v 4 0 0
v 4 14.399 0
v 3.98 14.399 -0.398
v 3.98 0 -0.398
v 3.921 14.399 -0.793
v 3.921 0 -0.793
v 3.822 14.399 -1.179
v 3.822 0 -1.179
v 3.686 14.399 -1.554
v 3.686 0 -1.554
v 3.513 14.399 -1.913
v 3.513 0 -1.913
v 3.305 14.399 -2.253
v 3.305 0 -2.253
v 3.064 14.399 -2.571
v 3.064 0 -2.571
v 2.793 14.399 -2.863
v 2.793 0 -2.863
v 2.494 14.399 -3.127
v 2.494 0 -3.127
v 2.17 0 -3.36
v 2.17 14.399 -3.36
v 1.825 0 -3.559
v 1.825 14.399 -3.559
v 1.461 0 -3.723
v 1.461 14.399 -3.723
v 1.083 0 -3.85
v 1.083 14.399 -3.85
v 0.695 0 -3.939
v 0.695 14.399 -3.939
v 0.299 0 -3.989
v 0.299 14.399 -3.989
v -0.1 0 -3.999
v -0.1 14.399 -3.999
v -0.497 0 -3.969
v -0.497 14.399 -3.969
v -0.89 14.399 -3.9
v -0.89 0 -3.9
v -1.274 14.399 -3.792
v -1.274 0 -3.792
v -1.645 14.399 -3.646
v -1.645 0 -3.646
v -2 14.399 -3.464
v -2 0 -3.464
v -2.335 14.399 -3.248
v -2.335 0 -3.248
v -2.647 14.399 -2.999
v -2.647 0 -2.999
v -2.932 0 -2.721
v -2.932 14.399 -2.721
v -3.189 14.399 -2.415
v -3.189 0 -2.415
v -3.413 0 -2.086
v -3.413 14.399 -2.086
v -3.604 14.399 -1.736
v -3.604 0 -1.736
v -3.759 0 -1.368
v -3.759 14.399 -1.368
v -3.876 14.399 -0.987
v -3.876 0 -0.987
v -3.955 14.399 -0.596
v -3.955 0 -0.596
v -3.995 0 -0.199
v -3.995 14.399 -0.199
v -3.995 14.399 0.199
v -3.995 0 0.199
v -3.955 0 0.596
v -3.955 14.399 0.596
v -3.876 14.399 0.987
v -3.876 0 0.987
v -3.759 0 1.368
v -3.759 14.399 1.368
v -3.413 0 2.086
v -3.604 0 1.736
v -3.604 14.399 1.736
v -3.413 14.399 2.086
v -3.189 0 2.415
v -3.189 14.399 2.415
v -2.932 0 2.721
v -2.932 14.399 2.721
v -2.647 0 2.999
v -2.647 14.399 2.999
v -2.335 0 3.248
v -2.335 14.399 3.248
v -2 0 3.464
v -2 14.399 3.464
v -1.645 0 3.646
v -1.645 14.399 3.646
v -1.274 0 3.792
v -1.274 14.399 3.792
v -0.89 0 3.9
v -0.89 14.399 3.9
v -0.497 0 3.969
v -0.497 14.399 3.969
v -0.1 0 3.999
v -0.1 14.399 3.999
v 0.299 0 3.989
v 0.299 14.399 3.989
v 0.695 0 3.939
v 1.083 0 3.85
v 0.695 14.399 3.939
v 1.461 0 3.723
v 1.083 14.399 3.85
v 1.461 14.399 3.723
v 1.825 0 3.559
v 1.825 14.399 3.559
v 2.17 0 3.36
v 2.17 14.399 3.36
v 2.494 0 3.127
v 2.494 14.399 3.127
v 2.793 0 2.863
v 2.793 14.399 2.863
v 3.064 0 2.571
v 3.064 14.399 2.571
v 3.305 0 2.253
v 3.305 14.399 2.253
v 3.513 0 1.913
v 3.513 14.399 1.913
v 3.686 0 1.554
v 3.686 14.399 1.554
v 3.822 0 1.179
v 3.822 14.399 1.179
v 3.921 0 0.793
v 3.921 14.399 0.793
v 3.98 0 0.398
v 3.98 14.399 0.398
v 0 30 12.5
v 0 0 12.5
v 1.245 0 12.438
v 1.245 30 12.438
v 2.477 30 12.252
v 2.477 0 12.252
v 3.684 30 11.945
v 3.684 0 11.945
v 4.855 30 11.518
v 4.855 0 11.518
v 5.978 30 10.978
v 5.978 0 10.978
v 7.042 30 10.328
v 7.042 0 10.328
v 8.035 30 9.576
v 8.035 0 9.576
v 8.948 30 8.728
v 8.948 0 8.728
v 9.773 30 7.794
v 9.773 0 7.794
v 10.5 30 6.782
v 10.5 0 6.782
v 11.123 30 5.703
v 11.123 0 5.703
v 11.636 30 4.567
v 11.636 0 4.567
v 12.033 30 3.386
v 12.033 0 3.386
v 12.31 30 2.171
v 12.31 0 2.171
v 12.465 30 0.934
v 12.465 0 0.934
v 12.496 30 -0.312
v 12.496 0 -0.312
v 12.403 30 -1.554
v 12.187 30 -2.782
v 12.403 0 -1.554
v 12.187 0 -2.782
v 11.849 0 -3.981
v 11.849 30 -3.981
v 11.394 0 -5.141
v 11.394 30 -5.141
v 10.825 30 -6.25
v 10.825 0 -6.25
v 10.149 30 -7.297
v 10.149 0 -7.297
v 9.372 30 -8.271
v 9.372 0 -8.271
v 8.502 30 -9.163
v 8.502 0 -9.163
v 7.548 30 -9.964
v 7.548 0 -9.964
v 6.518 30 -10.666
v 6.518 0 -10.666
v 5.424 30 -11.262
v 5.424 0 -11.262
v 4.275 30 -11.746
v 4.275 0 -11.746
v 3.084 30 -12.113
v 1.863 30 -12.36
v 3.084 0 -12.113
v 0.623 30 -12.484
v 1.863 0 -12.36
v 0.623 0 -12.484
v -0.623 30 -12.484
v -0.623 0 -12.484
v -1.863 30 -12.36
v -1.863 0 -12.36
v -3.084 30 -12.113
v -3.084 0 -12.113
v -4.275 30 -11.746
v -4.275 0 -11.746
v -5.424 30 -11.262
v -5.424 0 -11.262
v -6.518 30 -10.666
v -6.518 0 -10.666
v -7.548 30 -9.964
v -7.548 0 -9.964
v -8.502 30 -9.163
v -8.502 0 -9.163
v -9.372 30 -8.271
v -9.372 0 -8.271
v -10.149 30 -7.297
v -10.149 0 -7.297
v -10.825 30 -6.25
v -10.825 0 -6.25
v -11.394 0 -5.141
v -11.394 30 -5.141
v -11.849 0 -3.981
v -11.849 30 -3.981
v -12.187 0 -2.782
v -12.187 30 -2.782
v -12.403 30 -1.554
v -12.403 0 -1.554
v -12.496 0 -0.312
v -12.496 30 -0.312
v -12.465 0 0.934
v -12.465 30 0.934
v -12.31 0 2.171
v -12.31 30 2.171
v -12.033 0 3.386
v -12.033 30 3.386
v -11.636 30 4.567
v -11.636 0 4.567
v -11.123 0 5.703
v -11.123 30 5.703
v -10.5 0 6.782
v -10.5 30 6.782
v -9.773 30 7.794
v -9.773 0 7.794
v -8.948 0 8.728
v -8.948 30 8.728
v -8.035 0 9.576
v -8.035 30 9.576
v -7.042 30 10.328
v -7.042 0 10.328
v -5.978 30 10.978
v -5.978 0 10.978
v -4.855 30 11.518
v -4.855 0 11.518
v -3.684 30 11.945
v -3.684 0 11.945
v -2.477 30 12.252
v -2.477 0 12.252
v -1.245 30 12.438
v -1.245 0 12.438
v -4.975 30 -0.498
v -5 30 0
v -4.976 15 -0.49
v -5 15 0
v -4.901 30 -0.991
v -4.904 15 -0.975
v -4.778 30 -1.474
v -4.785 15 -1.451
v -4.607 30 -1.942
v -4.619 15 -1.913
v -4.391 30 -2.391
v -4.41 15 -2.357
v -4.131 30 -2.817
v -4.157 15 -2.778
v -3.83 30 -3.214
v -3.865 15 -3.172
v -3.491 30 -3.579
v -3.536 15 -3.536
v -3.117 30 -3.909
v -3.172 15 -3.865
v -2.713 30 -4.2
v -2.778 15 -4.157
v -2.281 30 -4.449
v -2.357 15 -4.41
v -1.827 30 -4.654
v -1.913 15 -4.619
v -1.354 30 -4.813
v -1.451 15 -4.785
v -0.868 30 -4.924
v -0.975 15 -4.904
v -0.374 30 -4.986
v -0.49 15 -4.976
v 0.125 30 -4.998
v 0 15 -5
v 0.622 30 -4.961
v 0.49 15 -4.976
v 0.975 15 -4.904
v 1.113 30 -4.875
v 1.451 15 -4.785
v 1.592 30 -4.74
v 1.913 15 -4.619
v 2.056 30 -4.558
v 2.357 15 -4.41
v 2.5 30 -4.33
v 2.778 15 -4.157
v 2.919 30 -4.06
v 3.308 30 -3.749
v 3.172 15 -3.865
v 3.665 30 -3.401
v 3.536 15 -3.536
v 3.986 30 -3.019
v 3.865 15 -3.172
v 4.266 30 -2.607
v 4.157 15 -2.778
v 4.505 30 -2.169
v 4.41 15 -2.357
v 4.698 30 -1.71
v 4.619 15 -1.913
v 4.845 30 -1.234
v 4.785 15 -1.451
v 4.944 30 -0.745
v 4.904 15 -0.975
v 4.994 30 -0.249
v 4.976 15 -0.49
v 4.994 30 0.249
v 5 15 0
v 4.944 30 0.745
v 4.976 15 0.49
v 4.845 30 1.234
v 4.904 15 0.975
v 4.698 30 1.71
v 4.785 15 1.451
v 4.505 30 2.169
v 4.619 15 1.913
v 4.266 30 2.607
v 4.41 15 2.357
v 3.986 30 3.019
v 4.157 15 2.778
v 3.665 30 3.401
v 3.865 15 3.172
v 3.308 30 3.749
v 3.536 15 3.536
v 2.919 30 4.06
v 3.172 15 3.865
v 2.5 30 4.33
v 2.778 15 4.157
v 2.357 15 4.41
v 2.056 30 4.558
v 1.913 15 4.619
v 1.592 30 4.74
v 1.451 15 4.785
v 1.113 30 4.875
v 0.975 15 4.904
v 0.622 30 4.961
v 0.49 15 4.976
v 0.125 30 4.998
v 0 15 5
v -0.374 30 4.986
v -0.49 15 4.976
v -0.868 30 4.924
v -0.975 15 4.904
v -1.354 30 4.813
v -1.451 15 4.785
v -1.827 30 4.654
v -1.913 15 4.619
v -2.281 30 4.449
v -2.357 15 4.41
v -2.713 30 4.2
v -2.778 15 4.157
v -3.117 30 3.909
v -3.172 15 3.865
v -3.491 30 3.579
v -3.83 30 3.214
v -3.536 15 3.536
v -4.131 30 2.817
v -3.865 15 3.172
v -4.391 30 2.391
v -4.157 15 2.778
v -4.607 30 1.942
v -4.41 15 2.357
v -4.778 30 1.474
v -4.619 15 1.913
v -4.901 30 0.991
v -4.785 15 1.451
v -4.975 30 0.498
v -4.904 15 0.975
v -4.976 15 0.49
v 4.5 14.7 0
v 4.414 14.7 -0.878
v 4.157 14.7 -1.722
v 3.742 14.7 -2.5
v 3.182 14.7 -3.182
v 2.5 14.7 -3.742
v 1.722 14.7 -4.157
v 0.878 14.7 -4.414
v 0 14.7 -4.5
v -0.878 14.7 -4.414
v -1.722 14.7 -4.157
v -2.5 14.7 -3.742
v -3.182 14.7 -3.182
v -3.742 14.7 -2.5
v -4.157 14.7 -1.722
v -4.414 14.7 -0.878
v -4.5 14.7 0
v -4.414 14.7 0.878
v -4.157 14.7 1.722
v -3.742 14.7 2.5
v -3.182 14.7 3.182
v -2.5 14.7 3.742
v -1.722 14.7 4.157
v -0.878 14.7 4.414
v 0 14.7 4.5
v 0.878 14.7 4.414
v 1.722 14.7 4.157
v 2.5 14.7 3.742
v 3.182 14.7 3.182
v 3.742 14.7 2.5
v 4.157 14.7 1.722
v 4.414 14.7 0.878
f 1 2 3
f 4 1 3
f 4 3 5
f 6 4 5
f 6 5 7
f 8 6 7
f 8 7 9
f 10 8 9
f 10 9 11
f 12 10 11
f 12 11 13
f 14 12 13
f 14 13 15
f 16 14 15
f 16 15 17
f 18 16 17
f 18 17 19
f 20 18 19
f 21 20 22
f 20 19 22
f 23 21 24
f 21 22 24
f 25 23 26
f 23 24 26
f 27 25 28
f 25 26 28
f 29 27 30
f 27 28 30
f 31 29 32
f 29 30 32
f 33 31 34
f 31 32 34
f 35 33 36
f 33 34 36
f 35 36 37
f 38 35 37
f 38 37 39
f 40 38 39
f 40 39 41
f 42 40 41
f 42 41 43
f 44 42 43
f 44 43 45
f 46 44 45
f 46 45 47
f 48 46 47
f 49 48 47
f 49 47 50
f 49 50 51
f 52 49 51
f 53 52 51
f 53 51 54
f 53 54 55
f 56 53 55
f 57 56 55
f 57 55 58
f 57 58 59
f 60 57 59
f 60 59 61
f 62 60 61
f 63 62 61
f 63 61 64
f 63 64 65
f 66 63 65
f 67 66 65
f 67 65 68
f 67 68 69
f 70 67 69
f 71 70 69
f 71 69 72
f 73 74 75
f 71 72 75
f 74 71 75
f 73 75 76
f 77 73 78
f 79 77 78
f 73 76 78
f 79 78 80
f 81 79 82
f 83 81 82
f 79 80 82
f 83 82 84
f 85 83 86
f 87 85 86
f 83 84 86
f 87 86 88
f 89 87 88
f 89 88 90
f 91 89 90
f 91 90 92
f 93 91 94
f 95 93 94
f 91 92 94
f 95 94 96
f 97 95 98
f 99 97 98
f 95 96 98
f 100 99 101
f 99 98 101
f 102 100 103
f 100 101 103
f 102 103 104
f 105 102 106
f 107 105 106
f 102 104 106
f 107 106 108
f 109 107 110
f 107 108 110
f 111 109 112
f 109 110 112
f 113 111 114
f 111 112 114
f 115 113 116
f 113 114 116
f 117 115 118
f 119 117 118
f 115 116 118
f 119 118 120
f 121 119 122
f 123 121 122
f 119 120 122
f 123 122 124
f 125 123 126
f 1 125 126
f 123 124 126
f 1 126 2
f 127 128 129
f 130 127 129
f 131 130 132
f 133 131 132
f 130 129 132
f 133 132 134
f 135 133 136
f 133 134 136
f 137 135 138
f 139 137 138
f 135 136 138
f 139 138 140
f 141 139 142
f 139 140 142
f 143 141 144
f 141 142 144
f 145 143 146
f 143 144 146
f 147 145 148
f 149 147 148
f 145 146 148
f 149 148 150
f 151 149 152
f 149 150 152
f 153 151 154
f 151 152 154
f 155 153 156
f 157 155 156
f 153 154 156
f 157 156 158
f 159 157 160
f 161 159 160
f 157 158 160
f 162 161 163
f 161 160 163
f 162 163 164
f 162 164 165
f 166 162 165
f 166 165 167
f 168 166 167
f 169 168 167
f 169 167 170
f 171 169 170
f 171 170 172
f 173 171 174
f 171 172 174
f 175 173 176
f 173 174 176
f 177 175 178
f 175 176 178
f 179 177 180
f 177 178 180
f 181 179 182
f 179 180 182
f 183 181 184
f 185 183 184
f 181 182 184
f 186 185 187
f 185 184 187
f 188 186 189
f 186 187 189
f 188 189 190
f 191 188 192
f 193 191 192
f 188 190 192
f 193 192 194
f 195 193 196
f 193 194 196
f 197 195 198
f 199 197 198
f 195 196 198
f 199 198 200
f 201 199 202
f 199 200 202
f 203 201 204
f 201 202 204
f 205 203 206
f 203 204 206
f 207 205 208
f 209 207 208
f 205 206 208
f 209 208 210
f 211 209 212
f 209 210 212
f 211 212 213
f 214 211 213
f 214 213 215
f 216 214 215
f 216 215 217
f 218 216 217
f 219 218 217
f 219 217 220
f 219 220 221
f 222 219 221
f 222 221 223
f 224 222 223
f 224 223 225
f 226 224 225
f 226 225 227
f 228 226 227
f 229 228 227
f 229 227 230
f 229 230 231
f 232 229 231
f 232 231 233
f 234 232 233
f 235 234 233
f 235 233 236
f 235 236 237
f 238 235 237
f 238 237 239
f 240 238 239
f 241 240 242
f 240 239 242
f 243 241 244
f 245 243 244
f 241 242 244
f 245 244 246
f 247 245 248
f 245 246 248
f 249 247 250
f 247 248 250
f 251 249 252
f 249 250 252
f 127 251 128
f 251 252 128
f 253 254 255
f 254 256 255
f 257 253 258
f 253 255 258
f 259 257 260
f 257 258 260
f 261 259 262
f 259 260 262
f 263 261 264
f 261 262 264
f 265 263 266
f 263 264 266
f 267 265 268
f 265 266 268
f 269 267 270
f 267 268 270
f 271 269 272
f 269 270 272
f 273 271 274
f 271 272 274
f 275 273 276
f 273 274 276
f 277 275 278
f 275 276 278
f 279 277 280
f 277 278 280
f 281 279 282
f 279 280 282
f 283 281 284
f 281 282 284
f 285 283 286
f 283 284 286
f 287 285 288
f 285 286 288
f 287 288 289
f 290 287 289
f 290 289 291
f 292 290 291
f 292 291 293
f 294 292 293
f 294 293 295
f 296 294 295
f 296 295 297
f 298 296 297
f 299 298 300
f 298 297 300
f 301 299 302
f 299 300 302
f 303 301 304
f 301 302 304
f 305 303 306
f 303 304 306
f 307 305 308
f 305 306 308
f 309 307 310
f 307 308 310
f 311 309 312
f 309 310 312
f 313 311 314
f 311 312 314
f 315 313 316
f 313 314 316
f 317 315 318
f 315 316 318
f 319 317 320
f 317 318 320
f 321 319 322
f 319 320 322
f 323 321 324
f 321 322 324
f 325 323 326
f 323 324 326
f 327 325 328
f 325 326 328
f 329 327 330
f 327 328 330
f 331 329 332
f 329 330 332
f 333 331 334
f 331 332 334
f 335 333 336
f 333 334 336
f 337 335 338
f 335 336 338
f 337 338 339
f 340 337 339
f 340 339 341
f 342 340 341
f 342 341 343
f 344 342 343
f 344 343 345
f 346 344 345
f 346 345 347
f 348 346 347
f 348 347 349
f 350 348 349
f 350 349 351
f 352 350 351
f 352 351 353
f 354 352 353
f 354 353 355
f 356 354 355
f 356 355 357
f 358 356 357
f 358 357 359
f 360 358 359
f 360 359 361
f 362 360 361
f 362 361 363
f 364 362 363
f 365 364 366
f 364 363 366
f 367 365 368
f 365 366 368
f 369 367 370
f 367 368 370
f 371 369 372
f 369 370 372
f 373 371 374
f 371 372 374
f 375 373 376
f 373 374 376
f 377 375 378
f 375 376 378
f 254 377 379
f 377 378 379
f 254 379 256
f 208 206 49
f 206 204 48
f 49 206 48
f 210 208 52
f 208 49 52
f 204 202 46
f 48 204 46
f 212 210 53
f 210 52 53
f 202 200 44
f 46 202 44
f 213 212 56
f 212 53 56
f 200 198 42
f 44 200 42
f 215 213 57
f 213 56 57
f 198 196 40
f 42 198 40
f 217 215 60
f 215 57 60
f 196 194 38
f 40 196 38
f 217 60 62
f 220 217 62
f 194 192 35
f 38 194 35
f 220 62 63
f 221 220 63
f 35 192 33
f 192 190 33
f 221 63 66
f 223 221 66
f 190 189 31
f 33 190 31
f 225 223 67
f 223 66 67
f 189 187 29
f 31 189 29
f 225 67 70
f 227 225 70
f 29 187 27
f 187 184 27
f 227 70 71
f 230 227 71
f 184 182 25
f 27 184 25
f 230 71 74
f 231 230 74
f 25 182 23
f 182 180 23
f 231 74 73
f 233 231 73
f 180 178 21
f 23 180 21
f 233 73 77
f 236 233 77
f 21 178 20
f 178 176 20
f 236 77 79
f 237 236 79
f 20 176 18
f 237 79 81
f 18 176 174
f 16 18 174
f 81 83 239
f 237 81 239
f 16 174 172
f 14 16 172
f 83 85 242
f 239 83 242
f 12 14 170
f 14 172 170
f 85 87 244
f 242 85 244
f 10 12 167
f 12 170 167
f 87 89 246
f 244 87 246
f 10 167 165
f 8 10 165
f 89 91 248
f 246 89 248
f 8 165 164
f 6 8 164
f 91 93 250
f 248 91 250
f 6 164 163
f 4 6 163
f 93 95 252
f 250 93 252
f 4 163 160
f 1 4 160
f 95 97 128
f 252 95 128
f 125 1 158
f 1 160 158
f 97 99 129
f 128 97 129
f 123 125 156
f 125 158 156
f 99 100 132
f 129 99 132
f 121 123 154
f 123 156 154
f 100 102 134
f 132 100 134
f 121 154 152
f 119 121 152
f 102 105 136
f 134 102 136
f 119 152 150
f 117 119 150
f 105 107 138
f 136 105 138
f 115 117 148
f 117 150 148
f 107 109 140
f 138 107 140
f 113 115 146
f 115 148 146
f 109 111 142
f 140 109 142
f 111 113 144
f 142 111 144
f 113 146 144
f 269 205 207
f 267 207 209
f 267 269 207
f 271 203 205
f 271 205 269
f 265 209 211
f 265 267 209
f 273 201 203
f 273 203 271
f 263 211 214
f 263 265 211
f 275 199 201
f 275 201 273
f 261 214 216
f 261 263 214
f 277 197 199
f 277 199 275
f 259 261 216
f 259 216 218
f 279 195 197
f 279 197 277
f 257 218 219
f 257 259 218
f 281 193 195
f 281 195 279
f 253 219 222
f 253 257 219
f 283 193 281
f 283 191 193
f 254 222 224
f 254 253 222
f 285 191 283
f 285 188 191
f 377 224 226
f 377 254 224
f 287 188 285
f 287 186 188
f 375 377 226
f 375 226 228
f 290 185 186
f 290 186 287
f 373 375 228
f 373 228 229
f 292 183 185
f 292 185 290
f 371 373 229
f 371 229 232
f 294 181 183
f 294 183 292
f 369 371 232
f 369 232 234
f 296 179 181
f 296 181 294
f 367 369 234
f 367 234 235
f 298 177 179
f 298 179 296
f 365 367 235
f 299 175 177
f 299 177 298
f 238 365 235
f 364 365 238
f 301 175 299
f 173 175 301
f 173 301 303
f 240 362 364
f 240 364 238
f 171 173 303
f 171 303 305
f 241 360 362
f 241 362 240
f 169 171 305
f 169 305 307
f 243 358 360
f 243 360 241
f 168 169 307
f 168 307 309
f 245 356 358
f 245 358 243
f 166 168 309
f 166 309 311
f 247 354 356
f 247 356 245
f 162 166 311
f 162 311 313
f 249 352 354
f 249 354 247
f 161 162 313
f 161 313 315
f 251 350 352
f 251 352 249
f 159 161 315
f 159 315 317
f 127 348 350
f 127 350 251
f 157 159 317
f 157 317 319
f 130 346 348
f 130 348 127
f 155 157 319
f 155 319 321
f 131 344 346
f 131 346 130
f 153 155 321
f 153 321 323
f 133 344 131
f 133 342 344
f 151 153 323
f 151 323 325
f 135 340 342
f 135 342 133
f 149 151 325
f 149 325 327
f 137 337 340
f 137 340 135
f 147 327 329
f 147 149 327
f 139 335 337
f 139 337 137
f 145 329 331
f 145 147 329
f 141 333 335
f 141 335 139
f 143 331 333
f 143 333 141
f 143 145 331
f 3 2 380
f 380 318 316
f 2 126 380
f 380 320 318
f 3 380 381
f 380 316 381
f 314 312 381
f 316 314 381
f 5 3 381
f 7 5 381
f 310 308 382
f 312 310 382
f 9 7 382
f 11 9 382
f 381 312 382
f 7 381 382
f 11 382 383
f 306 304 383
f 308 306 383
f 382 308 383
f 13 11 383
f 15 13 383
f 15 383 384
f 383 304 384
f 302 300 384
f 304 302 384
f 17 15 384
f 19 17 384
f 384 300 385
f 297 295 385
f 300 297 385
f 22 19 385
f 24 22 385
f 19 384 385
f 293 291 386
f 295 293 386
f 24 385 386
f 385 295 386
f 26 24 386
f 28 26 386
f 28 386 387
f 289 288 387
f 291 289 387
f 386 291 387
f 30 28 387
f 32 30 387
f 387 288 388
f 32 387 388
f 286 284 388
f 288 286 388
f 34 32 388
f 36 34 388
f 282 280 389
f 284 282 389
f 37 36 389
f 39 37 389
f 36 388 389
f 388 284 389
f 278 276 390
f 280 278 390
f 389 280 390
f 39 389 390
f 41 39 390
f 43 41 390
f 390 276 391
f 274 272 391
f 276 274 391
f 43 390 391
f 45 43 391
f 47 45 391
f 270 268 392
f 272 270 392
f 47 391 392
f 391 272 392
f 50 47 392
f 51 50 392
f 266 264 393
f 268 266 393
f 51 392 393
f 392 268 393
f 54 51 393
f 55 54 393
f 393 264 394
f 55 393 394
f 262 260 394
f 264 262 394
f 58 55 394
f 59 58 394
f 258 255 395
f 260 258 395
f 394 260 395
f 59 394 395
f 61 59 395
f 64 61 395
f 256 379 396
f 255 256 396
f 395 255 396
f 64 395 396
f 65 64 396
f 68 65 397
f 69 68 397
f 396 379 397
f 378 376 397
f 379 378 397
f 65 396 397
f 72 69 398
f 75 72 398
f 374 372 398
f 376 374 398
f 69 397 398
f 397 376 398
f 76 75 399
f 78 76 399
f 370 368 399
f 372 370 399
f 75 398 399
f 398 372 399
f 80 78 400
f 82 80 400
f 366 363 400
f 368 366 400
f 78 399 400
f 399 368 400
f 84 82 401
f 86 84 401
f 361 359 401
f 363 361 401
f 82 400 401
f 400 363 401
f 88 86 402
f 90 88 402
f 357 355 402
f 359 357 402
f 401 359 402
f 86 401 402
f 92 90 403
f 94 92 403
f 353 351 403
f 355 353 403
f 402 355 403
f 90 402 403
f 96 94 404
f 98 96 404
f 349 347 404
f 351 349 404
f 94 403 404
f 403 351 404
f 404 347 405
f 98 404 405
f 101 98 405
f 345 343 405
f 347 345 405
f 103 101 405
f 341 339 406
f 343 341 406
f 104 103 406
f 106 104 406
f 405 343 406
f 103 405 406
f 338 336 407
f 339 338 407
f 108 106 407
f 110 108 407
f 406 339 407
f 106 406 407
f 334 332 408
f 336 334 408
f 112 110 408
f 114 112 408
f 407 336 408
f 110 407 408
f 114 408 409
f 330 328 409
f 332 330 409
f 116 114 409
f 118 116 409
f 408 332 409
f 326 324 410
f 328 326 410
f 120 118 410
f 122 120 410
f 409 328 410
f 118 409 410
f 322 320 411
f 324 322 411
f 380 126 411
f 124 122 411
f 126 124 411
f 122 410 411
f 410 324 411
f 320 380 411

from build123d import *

# Parameters (mm, degrees)
SKETCH1_R                      = 12.5
BOSS_EXTRUDE1_DEPTH            = 30
F_10_0_10_DIAMETER_HOLE1_D     = 10
F_10_0_10_DIAMETER_HOLE1_DEPTH = 15
F_10_0_10_DIAMETER_HOLE1_TIP   = 3.004303095
F_8_0_8_DIAMETER_HOLE1_D       = 8
F_8_0_8_DIAMETER_HOLE1_DEPTH   = 15
F_8_0_8_DIAMETER_HOLE1_TIP     = 2.403442476


with BuildPart() as part:
    # Sketch1 → Boss-Extrude1 (new body)
    with BuildSketch(Plane(origin=(0, 0, 0), x_dir=(1, 0, 0), z_dir=(0, 1, 0))):
        with Locations(Location((0, 0, 0), (0, 0, 270))):
            Circle(SKETCH1_R)
    extrude(amount=BOSS_EXTRUDE1_DEPTH)

    # Ø10.0 (10) Diameter Hole1
    with Locations(Plane(origin=(0, 30, 0), x_dir=(1, 0, 0), z_dir=(0, 1, 0))):
        with Locations((0, 0)):
            Hole(F_10_0_10_DIAMETER_HOLE1_D / 2, depth=F_10_0_10_DIAMETER_HOLE1_DEPTH)
            with Locations((0, 0, -(F_10_0_10_DIAMETER_HOLE1_DEPTH + F_10_0_10_DIAMETER_HOLE1_TIP / 2))):  # 118° drill point
                Cone(0, F_10_0_10_DIAMETER_HOLE1_D / 2, F_10_0_10_DIAMETER_HOLE1_TIP, mode=Mode.SUBTRACT)

    # Ø8.0 (8) Diameter Hole1
    with Locations(Plane(origin=(0, 0, 0), x_dir=(-1, 0, 0), z_dir=(0, -1, 0))):
        with Locations((0, 0)):
            Hole(F_8_0_8_DIAMETER_HOLE1_D / 2, depth=F_8_0_8_DIAMETER_HOLE1_DEPTH)
            with Locations((0, 0, -(F_8_0_8_DIAMETER_HOLE1_DEPTH + F_8_0_8_DIAMETER_HOLE1_TIP / 2))):  # 118° drill point
                Cone(0, F_8_0_8_DIAMETER_HOLE1_D / 2, F_8_0_8_DIAMETER_HOLE1_TIP, mode=Mode.SUBTRACT)


solid = part.part
